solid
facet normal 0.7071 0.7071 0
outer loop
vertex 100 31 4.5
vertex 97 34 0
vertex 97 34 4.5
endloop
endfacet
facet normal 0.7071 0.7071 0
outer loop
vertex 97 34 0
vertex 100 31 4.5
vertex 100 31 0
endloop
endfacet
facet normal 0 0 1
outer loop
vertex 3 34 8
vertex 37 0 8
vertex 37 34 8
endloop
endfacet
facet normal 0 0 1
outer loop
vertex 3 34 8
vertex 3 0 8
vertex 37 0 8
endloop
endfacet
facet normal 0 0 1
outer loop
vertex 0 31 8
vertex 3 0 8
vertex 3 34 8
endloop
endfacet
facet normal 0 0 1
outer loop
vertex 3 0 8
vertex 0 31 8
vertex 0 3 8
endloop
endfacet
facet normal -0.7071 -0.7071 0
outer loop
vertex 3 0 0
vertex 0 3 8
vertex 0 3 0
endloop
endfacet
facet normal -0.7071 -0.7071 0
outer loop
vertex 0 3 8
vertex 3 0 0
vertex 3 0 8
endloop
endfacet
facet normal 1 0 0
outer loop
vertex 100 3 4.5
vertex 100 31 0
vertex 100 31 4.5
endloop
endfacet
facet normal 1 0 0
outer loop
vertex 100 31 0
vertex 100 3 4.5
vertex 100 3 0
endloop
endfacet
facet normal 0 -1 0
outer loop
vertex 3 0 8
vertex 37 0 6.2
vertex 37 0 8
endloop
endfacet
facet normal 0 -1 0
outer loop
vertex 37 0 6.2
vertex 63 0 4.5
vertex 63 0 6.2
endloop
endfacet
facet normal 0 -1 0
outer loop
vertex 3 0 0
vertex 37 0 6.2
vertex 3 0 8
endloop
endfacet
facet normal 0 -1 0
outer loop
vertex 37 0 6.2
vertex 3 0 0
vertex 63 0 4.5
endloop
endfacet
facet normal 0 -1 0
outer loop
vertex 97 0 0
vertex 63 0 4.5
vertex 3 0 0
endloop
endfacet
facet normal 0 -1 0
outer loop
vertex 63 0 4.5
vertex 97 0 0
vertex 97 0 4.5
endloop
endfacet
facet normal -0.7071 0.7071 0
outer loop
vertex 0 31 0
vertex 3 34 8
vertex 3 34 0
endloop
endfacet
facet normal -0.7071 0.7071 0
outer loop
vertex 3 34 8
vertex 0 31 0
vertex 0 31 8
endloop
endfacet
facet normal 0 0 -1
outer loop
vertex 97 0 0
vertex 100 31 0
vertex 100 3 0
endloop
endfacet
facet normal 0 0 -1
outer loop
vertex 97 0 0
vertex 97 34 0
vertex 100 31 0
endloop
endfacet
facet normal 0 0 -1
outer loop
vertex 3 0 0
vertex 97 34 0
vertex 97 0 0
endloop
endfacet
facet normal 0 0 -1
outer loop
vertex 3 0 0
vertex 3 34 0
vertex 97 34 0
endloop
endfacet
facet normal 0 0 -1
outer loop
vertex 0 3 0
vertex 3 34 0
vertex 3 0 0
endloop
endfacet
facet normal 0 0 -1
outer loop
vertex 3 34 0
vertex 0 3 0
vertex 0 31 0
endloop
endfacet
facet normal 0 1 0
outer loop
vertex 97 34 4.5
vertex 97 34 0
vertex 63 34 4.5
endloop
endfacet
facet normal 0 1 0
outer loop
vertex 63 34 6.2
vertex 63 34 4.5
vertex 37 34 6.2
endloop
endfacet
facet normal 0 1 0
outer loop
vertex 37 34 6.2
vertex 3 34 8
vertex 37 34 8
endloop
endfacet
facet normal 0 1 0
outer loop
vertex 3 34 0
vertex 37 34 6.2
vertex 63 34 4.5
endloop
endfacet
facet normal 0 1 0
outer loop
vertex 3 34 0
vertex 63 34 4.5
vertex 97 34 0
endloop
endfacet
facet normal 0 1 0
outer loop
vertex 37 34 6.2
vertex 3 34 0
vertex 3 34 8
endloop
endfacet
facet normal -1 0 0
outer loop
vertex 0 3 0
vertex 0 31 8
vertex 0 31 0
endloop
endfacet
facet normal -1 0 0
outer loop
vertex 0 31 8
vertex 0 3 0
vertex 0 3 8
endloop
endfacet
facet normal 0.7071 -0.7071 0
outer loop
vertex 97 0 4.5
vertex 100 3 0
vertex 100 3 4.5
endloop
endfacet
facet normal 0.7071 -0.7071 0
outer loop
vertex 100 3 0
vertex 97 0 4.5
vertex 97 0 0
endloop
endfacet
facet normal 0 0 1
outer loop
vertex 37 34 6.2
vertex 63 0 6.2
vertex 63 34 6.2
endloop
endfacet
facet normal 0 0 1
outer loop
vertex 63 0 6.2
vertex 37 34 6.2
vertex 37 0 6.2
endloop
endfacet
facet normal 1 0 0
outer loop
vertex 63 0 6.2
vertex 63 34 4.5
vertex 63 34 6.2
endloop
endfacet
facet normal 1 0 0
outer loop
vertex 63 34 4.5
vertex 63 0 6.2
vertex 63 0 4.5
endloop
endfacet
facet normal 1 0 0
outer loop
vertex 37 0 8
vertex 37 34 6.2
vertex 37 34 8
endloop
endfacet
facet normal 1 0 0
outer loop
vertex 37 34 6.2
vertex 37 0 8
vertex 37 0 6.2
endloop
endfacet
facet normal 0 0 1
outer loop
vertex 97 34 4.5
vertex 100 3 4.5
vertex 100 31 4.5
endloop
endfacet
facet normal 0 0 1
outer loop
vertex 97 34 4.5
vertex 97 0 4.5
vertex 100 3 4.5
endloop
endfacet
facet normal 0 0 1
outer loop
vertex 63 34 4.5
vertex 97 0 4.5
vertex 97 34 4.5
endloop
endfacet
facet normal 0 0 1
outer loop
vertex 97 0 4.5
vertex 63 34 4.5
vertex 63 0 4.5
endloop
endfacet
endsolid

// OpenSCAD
$fn = 32;

// ----------------------------------------------------------------------
// Stepped bar: twostep, 100 x 34 x 8/4.5 mm
// ----------------------------------------------------------------------

// --- parameters (mm) ---
bar_l = 100;              // bar length, X
bar_w = 34;               // bar width, Y
plate_t = 8;              // thickness of the thick zone, Z
thin_t = 4.5;             // thickness of the thin zone
corner_c = 3;             // corner chamfer of the bar
step_cut = 3.5;           // material removed from the thin zone
stair1_x = 37;            // position of the first stair
stair2_x = 63;            // position of the second stair
mid_t = 6.2;              // thickness of the middle zone
depth_1 = 1.8;            // depth of cut 1 from the top face
depth_2 = 3.5;            // depth of cut 2 from the top face

profile = [[3, 0], [97, 0], [100, 3], [100, 31], [97, 34], [3, 34], [0, 31], [0, 3]];  // primary outline, 8 points, counter clockwise
void_1 = [[37, -1], [63, -1], [63, 35], [37, 35]];  // first stair, 4 points
void_2 = [[63, -1], [101, -1], [101, 35], [63, 35]];  // second stair, 4 points

// --- the one profile operation ---
difference() {
  linear_extrude(height = plate_t) polygon(points = profile);
  translate([0, 0, plate_t - depth_1])
    linear_extrude(height = depth_1 + 1) polygon(points = void_1);
  translate([0, 0, plate_t - depth_2])
    linear_extrude(height = depth_2 + 1) polygon(points = void_2);
}
